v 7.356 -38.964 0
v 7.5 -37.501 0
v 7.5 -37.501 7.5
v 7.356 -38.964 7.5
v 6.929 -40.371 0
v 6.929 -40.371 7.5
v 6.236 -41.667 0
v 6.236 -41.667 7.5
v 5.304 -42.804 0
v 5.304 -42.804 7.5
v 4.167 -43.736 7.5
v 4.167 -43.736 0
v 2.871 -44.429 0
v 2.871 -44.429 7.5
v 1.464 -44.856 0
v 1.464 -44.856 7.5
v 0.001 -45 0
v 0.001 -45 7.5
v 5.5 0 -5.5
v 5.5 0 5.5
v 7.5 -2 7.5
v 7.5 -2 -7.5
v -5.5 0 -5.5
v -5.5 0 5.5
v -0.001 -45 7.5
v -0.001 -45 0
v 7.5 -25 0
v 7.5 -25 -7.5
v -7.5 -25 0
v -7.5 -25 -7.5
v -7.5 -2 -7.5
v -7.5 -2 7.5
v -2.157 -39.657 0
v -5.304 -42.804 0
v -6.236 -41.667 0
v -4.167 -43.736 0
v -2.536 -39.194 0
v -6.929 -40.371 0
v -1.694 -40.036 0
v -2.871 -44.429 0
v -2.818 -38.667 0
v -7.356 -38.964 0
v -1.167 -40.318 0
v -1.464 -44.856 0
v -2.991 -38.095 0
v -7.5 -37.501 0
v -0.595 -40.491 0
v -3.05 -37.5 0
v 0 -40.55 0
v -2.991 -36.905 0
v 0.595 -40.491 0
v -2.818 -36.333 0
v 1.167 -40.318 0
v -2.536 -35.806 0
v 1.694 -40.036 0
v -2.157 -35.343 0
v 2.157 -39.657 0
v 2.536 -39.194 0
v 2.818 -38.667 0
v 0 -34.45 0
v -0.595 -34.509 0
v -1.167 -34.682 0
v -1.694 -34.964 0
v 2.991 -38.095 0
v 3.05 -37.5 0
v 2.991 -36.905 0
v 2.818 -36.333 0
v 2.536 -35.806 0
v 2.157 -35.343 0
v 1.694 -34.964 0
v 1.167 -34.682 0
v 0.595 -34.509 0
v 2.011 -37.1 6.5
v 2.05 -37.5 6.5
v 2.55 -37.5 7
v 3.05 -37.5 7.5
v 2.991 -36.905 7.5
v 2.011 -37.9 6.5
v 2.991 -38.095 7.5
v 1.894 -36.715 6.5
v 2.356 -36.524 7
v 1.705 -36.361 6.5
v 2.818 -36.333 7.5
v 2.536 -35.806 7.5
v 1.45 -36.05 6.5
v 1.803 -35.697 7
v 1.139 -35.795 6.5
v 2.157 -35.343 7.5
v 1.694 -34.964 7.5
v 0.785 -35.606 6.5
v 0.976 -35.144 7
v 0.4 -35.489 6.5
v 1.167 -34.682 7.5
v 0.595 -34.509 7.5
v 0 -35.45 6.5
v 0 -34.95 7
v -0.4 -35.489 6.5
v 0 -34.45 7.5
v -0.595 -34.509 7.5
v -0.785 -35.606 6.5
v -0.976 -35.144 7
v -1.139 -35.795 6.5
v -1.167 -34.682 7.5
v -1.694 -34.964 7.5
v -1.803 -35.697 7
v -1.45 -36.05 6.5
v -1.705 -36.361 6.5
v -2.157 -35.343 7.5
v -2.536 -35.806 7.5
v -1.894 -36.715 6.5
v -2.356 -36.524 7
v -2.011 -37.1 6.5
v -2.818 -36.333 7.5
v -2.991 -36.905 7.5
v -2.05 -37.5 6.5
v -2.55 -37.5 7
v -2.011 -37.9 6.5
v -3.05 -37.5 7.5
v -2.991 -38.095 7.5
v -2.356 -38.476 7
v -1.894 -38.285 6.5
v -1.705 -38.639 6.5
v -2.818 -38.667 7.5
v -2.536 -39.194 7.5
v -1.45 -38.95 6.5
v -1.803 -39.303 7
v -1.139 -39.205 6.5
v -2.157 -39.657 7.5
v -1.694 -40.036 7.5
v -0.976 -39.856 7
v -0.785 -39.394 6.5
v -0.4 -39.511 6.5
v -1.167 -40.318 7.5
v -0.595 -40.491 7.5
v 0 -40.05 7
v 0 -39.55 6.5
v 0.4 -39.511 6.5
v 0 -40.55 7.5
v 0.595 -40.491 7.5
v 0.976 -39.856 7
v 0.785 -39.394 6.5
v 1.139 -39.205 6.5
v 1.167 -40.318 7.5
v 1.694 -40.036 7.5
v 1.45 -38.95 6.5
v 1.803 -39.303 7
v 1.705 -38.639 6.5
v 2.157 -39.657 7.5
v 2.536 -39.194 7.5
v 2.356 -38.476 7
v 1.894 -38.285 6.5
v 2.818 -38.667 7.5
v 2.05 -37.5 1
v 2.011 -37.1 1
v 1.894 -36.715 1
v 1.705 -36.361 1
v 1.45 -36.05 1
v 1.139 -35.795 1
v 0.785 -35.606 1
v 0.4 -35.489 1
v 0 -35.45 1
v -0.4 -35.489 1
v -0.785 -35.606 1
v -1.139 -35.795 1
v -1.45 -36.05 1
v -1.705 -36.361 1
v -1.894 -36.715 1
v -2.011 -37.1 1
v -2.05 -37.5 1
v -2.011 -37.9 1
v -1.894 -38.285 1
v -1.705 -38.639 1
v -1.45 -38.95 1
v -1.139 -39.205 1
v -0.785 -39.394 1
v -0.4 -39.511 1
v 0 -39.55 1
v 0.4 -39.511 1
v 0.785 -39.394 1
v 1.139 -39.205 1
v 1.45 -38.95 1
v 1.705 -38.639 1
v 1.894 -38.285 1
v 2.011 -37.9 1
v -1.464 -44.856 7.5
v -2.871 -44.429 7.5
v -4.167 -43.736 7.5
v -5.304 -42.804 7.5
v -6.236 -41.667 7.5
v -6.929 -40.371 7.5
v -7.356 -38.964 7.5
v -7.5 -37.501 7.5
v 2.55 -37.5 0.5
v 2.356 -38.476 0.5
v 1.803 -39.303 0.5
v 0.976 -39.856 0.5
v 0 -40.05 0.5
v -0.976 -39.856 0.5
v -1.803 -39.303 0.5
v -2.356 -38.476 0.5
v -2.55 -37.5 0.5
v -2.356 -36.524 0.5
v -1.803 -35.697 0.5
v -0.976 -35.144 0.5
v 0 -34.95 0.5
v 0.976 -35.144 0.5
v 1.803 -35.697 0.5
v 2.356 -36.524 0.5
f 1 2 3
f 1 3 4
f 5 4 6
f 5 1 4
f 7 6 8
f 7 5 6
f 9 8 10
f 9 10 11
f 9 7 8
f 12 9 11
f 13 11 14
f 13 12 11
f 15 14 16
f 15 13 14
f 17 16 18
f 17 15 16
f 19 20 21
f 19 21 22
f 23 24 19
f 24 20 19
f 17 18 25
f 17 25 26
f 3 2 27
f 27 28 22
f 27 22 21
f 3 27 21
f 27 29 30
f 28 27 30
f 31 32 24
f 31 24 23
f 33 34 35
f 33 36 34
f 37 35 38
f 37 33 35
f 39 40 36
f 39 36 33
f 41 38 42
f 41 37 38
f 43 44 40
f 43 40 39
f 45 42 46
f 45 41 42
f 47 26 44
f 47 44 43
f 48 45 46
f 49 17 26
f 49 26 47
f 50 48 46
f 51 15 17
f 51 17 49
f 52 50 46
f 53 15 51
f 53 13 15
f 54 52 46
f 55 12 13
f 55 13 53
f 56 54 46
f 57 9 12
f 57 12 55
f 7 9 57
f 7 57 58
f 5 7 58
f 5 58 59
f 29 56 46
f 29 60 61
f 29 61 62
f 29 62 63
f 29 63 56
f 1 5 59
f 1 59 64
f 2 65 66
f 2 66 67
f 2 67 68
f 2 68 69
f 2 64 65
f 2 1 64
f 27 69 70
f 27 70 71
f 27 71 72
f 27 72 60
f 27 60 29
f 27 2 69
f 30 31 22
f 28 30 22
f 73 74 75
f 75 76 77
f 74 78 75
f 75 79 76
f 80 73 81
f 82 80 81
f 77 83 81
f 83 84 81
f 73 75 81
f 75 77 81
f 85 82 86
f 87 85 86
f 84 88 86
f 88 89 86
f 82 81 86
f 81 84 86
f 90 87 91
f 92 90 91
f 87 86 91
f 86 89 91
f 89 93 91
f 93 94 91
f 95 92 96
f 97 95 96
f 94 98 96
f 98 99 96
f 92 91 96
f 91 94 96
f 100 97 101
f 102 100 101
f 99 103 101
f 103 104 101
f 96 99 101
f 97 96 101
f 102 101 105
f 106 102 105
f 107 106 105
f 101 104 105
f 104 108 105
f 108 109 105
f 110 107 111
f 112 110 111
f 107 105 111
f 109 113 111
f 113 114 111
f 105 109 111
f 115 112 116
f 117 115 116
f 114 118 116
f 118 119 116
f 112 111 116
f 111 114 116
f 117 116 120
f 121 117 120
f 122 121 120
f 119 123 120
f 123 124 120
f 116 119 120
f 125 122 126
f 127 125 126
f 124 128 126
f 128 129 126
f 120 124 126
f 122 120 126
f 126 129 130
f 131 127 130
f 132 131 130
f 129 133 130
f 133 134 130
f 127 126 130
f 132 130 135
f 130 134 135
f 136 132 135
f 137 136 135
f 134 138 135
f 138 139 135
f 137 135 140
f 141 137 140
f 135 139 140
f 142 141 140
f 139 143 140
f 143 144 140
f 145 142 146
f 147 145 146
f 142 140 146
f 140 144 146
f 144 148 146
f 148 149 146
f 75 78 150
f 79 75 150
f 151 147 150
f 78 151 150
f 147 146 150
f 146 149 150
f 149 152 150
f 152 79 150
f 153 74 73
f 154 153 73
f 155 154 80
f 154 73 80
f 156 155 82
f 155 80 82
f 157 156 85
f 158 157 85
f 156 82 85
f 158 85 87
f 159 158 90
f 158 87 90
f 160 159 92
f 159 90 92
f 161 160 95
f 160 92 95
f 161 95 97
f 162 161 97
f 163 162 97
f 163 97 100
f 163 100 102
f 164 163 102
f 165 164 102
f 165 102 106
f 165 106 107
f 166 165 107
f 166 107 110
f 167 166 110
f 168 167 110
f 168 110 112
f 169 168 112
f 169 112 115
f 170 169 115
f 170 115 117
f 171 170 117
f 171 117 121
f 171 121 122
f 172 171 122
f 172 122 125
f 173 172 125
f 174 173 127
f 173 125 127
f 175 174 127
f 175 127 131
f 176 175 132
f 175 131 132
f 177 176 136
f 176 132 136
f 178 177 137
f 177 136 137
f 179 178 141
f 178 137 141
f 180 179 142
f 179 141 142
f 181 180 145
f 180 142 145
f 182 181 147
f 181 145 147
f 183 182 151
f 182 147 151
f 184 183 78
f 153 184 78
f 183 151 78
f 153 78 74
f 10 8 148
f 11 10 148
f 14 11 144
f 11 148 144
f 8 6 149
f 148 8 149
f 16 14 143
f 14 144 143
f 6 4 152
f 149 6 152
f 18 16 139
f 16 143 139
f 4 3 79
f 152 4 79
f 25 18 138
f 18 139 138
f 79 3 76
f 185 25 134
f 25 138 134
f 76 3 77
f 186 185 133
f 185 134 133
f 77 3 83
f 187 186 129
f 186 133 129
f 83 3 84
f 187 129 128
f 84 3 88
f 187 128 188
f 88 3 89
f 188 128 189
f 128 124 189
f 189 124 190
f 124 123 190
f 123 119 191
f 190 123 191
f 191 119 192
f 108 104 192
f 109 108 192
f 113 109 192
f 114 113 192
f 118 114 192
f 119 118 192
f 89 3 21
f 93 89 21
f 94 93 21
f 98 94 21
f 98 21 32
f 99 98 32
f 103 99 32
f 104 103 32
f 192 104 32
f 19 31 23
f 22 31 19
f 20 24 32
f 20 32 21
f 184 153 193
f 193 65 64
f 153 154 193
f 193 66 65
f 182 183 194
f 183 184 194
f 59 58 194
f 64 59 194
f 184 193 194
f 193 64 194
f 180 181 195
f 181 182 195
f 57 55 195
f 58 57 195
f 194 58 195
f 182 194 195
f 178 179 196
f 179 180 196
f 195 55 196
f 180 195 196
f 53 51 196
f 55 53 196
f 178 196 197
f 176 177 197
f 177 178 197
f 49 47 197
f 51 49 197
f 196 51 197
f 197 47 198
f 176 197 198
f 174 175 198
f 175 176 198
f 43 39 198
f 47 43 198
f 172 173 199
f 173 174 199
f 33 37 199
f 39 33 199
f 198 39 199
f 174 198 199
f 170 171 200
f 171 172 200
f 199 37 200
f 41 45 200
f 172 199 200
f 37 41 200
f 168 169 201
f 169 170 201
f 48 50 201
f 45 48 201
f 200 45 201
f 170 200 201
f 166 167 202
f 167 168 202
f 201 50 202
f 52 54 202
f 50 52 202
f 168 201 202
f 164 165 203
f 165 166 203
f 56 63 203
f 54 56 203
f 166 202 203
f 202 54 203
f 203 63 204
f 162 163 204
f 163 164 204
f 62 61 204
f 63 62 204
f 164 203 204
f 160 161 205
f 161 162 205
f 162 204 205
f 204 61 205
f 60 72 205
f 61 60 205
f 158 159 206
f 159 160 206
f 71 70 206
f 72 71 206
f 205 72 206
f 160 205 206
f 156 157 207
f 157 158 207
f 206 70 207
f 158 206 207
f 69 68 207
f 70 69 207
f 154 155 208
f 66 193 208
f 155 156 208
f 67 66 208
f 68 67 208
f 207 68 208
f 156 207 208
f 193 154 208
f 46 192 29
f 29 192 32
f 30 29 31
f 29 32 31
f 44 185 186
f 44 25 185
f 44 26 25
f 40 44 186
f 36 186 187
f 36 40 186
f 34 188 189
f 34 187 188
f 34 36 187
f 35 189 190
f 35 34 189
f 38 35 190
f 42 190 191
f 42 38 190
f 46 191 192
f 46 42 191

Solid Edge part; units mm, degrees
sketch "Sketch1" plane through (0, 0, 0) normal (0, -1, 0) x (1, 0, 0)
  line L0 (-7.5, -7.5) -> (7.5, -7.5)
  line L1 (7.5, -7.5) -> (7.5, 7.5)
  line L2 (7.5, 7.5) -> (-7.5, 7.5)
  line L3 (-7.5, 7.5) -> (-7.5, -7.5)
  dimension "D1" = 15
  dimension "D2" = 15
extrude "Protrusion1" add sketch "Sketch1" along normal blind 25
sketch "Sketch2" plane through (7.5, -10, 0) normal (1, 0, 0) x (0, 1, 0)
  line L0 (-15, 7.5) -> (-35, 7.5)
  line L1 (-35, 7.5) -> (-35, 0)
  line L2 (-35, 0) -> (-15, 0)
  line L3 (-15, 0) -> (-15, 7.5)
  dimension "D1" = 20
extrude "Protrusion2" add sketch "Sketch2" against normal up to vertex (15 mm away)
fillet "Verrundung_1" radius 7.5 2 edges at (7.5, -45, 3.75) (-7.5, -45, 3.75)
sketch "Sketch3" plane through (0, -17.5, 7.5) normal (0, 0, 1) x (1, 0, 0)
  circle A0 centre (0, -20) radius 2.05
  dimension "D1" = 4.1
extrude "Cutout1" cut sketch "Sketch3" against normal through all
chamfer "Fase_1" distance 1 angle 45 2 edges at (2.05, -37.5, 0) (-2.05, -37.5, 7.5)
chamfer "Fase_2" distance 2 angle 45 4 edges at (0, 0, 7.5) (7.5, 0, 0) (0, 0, -7.5) (-7.5, 0, 0)
